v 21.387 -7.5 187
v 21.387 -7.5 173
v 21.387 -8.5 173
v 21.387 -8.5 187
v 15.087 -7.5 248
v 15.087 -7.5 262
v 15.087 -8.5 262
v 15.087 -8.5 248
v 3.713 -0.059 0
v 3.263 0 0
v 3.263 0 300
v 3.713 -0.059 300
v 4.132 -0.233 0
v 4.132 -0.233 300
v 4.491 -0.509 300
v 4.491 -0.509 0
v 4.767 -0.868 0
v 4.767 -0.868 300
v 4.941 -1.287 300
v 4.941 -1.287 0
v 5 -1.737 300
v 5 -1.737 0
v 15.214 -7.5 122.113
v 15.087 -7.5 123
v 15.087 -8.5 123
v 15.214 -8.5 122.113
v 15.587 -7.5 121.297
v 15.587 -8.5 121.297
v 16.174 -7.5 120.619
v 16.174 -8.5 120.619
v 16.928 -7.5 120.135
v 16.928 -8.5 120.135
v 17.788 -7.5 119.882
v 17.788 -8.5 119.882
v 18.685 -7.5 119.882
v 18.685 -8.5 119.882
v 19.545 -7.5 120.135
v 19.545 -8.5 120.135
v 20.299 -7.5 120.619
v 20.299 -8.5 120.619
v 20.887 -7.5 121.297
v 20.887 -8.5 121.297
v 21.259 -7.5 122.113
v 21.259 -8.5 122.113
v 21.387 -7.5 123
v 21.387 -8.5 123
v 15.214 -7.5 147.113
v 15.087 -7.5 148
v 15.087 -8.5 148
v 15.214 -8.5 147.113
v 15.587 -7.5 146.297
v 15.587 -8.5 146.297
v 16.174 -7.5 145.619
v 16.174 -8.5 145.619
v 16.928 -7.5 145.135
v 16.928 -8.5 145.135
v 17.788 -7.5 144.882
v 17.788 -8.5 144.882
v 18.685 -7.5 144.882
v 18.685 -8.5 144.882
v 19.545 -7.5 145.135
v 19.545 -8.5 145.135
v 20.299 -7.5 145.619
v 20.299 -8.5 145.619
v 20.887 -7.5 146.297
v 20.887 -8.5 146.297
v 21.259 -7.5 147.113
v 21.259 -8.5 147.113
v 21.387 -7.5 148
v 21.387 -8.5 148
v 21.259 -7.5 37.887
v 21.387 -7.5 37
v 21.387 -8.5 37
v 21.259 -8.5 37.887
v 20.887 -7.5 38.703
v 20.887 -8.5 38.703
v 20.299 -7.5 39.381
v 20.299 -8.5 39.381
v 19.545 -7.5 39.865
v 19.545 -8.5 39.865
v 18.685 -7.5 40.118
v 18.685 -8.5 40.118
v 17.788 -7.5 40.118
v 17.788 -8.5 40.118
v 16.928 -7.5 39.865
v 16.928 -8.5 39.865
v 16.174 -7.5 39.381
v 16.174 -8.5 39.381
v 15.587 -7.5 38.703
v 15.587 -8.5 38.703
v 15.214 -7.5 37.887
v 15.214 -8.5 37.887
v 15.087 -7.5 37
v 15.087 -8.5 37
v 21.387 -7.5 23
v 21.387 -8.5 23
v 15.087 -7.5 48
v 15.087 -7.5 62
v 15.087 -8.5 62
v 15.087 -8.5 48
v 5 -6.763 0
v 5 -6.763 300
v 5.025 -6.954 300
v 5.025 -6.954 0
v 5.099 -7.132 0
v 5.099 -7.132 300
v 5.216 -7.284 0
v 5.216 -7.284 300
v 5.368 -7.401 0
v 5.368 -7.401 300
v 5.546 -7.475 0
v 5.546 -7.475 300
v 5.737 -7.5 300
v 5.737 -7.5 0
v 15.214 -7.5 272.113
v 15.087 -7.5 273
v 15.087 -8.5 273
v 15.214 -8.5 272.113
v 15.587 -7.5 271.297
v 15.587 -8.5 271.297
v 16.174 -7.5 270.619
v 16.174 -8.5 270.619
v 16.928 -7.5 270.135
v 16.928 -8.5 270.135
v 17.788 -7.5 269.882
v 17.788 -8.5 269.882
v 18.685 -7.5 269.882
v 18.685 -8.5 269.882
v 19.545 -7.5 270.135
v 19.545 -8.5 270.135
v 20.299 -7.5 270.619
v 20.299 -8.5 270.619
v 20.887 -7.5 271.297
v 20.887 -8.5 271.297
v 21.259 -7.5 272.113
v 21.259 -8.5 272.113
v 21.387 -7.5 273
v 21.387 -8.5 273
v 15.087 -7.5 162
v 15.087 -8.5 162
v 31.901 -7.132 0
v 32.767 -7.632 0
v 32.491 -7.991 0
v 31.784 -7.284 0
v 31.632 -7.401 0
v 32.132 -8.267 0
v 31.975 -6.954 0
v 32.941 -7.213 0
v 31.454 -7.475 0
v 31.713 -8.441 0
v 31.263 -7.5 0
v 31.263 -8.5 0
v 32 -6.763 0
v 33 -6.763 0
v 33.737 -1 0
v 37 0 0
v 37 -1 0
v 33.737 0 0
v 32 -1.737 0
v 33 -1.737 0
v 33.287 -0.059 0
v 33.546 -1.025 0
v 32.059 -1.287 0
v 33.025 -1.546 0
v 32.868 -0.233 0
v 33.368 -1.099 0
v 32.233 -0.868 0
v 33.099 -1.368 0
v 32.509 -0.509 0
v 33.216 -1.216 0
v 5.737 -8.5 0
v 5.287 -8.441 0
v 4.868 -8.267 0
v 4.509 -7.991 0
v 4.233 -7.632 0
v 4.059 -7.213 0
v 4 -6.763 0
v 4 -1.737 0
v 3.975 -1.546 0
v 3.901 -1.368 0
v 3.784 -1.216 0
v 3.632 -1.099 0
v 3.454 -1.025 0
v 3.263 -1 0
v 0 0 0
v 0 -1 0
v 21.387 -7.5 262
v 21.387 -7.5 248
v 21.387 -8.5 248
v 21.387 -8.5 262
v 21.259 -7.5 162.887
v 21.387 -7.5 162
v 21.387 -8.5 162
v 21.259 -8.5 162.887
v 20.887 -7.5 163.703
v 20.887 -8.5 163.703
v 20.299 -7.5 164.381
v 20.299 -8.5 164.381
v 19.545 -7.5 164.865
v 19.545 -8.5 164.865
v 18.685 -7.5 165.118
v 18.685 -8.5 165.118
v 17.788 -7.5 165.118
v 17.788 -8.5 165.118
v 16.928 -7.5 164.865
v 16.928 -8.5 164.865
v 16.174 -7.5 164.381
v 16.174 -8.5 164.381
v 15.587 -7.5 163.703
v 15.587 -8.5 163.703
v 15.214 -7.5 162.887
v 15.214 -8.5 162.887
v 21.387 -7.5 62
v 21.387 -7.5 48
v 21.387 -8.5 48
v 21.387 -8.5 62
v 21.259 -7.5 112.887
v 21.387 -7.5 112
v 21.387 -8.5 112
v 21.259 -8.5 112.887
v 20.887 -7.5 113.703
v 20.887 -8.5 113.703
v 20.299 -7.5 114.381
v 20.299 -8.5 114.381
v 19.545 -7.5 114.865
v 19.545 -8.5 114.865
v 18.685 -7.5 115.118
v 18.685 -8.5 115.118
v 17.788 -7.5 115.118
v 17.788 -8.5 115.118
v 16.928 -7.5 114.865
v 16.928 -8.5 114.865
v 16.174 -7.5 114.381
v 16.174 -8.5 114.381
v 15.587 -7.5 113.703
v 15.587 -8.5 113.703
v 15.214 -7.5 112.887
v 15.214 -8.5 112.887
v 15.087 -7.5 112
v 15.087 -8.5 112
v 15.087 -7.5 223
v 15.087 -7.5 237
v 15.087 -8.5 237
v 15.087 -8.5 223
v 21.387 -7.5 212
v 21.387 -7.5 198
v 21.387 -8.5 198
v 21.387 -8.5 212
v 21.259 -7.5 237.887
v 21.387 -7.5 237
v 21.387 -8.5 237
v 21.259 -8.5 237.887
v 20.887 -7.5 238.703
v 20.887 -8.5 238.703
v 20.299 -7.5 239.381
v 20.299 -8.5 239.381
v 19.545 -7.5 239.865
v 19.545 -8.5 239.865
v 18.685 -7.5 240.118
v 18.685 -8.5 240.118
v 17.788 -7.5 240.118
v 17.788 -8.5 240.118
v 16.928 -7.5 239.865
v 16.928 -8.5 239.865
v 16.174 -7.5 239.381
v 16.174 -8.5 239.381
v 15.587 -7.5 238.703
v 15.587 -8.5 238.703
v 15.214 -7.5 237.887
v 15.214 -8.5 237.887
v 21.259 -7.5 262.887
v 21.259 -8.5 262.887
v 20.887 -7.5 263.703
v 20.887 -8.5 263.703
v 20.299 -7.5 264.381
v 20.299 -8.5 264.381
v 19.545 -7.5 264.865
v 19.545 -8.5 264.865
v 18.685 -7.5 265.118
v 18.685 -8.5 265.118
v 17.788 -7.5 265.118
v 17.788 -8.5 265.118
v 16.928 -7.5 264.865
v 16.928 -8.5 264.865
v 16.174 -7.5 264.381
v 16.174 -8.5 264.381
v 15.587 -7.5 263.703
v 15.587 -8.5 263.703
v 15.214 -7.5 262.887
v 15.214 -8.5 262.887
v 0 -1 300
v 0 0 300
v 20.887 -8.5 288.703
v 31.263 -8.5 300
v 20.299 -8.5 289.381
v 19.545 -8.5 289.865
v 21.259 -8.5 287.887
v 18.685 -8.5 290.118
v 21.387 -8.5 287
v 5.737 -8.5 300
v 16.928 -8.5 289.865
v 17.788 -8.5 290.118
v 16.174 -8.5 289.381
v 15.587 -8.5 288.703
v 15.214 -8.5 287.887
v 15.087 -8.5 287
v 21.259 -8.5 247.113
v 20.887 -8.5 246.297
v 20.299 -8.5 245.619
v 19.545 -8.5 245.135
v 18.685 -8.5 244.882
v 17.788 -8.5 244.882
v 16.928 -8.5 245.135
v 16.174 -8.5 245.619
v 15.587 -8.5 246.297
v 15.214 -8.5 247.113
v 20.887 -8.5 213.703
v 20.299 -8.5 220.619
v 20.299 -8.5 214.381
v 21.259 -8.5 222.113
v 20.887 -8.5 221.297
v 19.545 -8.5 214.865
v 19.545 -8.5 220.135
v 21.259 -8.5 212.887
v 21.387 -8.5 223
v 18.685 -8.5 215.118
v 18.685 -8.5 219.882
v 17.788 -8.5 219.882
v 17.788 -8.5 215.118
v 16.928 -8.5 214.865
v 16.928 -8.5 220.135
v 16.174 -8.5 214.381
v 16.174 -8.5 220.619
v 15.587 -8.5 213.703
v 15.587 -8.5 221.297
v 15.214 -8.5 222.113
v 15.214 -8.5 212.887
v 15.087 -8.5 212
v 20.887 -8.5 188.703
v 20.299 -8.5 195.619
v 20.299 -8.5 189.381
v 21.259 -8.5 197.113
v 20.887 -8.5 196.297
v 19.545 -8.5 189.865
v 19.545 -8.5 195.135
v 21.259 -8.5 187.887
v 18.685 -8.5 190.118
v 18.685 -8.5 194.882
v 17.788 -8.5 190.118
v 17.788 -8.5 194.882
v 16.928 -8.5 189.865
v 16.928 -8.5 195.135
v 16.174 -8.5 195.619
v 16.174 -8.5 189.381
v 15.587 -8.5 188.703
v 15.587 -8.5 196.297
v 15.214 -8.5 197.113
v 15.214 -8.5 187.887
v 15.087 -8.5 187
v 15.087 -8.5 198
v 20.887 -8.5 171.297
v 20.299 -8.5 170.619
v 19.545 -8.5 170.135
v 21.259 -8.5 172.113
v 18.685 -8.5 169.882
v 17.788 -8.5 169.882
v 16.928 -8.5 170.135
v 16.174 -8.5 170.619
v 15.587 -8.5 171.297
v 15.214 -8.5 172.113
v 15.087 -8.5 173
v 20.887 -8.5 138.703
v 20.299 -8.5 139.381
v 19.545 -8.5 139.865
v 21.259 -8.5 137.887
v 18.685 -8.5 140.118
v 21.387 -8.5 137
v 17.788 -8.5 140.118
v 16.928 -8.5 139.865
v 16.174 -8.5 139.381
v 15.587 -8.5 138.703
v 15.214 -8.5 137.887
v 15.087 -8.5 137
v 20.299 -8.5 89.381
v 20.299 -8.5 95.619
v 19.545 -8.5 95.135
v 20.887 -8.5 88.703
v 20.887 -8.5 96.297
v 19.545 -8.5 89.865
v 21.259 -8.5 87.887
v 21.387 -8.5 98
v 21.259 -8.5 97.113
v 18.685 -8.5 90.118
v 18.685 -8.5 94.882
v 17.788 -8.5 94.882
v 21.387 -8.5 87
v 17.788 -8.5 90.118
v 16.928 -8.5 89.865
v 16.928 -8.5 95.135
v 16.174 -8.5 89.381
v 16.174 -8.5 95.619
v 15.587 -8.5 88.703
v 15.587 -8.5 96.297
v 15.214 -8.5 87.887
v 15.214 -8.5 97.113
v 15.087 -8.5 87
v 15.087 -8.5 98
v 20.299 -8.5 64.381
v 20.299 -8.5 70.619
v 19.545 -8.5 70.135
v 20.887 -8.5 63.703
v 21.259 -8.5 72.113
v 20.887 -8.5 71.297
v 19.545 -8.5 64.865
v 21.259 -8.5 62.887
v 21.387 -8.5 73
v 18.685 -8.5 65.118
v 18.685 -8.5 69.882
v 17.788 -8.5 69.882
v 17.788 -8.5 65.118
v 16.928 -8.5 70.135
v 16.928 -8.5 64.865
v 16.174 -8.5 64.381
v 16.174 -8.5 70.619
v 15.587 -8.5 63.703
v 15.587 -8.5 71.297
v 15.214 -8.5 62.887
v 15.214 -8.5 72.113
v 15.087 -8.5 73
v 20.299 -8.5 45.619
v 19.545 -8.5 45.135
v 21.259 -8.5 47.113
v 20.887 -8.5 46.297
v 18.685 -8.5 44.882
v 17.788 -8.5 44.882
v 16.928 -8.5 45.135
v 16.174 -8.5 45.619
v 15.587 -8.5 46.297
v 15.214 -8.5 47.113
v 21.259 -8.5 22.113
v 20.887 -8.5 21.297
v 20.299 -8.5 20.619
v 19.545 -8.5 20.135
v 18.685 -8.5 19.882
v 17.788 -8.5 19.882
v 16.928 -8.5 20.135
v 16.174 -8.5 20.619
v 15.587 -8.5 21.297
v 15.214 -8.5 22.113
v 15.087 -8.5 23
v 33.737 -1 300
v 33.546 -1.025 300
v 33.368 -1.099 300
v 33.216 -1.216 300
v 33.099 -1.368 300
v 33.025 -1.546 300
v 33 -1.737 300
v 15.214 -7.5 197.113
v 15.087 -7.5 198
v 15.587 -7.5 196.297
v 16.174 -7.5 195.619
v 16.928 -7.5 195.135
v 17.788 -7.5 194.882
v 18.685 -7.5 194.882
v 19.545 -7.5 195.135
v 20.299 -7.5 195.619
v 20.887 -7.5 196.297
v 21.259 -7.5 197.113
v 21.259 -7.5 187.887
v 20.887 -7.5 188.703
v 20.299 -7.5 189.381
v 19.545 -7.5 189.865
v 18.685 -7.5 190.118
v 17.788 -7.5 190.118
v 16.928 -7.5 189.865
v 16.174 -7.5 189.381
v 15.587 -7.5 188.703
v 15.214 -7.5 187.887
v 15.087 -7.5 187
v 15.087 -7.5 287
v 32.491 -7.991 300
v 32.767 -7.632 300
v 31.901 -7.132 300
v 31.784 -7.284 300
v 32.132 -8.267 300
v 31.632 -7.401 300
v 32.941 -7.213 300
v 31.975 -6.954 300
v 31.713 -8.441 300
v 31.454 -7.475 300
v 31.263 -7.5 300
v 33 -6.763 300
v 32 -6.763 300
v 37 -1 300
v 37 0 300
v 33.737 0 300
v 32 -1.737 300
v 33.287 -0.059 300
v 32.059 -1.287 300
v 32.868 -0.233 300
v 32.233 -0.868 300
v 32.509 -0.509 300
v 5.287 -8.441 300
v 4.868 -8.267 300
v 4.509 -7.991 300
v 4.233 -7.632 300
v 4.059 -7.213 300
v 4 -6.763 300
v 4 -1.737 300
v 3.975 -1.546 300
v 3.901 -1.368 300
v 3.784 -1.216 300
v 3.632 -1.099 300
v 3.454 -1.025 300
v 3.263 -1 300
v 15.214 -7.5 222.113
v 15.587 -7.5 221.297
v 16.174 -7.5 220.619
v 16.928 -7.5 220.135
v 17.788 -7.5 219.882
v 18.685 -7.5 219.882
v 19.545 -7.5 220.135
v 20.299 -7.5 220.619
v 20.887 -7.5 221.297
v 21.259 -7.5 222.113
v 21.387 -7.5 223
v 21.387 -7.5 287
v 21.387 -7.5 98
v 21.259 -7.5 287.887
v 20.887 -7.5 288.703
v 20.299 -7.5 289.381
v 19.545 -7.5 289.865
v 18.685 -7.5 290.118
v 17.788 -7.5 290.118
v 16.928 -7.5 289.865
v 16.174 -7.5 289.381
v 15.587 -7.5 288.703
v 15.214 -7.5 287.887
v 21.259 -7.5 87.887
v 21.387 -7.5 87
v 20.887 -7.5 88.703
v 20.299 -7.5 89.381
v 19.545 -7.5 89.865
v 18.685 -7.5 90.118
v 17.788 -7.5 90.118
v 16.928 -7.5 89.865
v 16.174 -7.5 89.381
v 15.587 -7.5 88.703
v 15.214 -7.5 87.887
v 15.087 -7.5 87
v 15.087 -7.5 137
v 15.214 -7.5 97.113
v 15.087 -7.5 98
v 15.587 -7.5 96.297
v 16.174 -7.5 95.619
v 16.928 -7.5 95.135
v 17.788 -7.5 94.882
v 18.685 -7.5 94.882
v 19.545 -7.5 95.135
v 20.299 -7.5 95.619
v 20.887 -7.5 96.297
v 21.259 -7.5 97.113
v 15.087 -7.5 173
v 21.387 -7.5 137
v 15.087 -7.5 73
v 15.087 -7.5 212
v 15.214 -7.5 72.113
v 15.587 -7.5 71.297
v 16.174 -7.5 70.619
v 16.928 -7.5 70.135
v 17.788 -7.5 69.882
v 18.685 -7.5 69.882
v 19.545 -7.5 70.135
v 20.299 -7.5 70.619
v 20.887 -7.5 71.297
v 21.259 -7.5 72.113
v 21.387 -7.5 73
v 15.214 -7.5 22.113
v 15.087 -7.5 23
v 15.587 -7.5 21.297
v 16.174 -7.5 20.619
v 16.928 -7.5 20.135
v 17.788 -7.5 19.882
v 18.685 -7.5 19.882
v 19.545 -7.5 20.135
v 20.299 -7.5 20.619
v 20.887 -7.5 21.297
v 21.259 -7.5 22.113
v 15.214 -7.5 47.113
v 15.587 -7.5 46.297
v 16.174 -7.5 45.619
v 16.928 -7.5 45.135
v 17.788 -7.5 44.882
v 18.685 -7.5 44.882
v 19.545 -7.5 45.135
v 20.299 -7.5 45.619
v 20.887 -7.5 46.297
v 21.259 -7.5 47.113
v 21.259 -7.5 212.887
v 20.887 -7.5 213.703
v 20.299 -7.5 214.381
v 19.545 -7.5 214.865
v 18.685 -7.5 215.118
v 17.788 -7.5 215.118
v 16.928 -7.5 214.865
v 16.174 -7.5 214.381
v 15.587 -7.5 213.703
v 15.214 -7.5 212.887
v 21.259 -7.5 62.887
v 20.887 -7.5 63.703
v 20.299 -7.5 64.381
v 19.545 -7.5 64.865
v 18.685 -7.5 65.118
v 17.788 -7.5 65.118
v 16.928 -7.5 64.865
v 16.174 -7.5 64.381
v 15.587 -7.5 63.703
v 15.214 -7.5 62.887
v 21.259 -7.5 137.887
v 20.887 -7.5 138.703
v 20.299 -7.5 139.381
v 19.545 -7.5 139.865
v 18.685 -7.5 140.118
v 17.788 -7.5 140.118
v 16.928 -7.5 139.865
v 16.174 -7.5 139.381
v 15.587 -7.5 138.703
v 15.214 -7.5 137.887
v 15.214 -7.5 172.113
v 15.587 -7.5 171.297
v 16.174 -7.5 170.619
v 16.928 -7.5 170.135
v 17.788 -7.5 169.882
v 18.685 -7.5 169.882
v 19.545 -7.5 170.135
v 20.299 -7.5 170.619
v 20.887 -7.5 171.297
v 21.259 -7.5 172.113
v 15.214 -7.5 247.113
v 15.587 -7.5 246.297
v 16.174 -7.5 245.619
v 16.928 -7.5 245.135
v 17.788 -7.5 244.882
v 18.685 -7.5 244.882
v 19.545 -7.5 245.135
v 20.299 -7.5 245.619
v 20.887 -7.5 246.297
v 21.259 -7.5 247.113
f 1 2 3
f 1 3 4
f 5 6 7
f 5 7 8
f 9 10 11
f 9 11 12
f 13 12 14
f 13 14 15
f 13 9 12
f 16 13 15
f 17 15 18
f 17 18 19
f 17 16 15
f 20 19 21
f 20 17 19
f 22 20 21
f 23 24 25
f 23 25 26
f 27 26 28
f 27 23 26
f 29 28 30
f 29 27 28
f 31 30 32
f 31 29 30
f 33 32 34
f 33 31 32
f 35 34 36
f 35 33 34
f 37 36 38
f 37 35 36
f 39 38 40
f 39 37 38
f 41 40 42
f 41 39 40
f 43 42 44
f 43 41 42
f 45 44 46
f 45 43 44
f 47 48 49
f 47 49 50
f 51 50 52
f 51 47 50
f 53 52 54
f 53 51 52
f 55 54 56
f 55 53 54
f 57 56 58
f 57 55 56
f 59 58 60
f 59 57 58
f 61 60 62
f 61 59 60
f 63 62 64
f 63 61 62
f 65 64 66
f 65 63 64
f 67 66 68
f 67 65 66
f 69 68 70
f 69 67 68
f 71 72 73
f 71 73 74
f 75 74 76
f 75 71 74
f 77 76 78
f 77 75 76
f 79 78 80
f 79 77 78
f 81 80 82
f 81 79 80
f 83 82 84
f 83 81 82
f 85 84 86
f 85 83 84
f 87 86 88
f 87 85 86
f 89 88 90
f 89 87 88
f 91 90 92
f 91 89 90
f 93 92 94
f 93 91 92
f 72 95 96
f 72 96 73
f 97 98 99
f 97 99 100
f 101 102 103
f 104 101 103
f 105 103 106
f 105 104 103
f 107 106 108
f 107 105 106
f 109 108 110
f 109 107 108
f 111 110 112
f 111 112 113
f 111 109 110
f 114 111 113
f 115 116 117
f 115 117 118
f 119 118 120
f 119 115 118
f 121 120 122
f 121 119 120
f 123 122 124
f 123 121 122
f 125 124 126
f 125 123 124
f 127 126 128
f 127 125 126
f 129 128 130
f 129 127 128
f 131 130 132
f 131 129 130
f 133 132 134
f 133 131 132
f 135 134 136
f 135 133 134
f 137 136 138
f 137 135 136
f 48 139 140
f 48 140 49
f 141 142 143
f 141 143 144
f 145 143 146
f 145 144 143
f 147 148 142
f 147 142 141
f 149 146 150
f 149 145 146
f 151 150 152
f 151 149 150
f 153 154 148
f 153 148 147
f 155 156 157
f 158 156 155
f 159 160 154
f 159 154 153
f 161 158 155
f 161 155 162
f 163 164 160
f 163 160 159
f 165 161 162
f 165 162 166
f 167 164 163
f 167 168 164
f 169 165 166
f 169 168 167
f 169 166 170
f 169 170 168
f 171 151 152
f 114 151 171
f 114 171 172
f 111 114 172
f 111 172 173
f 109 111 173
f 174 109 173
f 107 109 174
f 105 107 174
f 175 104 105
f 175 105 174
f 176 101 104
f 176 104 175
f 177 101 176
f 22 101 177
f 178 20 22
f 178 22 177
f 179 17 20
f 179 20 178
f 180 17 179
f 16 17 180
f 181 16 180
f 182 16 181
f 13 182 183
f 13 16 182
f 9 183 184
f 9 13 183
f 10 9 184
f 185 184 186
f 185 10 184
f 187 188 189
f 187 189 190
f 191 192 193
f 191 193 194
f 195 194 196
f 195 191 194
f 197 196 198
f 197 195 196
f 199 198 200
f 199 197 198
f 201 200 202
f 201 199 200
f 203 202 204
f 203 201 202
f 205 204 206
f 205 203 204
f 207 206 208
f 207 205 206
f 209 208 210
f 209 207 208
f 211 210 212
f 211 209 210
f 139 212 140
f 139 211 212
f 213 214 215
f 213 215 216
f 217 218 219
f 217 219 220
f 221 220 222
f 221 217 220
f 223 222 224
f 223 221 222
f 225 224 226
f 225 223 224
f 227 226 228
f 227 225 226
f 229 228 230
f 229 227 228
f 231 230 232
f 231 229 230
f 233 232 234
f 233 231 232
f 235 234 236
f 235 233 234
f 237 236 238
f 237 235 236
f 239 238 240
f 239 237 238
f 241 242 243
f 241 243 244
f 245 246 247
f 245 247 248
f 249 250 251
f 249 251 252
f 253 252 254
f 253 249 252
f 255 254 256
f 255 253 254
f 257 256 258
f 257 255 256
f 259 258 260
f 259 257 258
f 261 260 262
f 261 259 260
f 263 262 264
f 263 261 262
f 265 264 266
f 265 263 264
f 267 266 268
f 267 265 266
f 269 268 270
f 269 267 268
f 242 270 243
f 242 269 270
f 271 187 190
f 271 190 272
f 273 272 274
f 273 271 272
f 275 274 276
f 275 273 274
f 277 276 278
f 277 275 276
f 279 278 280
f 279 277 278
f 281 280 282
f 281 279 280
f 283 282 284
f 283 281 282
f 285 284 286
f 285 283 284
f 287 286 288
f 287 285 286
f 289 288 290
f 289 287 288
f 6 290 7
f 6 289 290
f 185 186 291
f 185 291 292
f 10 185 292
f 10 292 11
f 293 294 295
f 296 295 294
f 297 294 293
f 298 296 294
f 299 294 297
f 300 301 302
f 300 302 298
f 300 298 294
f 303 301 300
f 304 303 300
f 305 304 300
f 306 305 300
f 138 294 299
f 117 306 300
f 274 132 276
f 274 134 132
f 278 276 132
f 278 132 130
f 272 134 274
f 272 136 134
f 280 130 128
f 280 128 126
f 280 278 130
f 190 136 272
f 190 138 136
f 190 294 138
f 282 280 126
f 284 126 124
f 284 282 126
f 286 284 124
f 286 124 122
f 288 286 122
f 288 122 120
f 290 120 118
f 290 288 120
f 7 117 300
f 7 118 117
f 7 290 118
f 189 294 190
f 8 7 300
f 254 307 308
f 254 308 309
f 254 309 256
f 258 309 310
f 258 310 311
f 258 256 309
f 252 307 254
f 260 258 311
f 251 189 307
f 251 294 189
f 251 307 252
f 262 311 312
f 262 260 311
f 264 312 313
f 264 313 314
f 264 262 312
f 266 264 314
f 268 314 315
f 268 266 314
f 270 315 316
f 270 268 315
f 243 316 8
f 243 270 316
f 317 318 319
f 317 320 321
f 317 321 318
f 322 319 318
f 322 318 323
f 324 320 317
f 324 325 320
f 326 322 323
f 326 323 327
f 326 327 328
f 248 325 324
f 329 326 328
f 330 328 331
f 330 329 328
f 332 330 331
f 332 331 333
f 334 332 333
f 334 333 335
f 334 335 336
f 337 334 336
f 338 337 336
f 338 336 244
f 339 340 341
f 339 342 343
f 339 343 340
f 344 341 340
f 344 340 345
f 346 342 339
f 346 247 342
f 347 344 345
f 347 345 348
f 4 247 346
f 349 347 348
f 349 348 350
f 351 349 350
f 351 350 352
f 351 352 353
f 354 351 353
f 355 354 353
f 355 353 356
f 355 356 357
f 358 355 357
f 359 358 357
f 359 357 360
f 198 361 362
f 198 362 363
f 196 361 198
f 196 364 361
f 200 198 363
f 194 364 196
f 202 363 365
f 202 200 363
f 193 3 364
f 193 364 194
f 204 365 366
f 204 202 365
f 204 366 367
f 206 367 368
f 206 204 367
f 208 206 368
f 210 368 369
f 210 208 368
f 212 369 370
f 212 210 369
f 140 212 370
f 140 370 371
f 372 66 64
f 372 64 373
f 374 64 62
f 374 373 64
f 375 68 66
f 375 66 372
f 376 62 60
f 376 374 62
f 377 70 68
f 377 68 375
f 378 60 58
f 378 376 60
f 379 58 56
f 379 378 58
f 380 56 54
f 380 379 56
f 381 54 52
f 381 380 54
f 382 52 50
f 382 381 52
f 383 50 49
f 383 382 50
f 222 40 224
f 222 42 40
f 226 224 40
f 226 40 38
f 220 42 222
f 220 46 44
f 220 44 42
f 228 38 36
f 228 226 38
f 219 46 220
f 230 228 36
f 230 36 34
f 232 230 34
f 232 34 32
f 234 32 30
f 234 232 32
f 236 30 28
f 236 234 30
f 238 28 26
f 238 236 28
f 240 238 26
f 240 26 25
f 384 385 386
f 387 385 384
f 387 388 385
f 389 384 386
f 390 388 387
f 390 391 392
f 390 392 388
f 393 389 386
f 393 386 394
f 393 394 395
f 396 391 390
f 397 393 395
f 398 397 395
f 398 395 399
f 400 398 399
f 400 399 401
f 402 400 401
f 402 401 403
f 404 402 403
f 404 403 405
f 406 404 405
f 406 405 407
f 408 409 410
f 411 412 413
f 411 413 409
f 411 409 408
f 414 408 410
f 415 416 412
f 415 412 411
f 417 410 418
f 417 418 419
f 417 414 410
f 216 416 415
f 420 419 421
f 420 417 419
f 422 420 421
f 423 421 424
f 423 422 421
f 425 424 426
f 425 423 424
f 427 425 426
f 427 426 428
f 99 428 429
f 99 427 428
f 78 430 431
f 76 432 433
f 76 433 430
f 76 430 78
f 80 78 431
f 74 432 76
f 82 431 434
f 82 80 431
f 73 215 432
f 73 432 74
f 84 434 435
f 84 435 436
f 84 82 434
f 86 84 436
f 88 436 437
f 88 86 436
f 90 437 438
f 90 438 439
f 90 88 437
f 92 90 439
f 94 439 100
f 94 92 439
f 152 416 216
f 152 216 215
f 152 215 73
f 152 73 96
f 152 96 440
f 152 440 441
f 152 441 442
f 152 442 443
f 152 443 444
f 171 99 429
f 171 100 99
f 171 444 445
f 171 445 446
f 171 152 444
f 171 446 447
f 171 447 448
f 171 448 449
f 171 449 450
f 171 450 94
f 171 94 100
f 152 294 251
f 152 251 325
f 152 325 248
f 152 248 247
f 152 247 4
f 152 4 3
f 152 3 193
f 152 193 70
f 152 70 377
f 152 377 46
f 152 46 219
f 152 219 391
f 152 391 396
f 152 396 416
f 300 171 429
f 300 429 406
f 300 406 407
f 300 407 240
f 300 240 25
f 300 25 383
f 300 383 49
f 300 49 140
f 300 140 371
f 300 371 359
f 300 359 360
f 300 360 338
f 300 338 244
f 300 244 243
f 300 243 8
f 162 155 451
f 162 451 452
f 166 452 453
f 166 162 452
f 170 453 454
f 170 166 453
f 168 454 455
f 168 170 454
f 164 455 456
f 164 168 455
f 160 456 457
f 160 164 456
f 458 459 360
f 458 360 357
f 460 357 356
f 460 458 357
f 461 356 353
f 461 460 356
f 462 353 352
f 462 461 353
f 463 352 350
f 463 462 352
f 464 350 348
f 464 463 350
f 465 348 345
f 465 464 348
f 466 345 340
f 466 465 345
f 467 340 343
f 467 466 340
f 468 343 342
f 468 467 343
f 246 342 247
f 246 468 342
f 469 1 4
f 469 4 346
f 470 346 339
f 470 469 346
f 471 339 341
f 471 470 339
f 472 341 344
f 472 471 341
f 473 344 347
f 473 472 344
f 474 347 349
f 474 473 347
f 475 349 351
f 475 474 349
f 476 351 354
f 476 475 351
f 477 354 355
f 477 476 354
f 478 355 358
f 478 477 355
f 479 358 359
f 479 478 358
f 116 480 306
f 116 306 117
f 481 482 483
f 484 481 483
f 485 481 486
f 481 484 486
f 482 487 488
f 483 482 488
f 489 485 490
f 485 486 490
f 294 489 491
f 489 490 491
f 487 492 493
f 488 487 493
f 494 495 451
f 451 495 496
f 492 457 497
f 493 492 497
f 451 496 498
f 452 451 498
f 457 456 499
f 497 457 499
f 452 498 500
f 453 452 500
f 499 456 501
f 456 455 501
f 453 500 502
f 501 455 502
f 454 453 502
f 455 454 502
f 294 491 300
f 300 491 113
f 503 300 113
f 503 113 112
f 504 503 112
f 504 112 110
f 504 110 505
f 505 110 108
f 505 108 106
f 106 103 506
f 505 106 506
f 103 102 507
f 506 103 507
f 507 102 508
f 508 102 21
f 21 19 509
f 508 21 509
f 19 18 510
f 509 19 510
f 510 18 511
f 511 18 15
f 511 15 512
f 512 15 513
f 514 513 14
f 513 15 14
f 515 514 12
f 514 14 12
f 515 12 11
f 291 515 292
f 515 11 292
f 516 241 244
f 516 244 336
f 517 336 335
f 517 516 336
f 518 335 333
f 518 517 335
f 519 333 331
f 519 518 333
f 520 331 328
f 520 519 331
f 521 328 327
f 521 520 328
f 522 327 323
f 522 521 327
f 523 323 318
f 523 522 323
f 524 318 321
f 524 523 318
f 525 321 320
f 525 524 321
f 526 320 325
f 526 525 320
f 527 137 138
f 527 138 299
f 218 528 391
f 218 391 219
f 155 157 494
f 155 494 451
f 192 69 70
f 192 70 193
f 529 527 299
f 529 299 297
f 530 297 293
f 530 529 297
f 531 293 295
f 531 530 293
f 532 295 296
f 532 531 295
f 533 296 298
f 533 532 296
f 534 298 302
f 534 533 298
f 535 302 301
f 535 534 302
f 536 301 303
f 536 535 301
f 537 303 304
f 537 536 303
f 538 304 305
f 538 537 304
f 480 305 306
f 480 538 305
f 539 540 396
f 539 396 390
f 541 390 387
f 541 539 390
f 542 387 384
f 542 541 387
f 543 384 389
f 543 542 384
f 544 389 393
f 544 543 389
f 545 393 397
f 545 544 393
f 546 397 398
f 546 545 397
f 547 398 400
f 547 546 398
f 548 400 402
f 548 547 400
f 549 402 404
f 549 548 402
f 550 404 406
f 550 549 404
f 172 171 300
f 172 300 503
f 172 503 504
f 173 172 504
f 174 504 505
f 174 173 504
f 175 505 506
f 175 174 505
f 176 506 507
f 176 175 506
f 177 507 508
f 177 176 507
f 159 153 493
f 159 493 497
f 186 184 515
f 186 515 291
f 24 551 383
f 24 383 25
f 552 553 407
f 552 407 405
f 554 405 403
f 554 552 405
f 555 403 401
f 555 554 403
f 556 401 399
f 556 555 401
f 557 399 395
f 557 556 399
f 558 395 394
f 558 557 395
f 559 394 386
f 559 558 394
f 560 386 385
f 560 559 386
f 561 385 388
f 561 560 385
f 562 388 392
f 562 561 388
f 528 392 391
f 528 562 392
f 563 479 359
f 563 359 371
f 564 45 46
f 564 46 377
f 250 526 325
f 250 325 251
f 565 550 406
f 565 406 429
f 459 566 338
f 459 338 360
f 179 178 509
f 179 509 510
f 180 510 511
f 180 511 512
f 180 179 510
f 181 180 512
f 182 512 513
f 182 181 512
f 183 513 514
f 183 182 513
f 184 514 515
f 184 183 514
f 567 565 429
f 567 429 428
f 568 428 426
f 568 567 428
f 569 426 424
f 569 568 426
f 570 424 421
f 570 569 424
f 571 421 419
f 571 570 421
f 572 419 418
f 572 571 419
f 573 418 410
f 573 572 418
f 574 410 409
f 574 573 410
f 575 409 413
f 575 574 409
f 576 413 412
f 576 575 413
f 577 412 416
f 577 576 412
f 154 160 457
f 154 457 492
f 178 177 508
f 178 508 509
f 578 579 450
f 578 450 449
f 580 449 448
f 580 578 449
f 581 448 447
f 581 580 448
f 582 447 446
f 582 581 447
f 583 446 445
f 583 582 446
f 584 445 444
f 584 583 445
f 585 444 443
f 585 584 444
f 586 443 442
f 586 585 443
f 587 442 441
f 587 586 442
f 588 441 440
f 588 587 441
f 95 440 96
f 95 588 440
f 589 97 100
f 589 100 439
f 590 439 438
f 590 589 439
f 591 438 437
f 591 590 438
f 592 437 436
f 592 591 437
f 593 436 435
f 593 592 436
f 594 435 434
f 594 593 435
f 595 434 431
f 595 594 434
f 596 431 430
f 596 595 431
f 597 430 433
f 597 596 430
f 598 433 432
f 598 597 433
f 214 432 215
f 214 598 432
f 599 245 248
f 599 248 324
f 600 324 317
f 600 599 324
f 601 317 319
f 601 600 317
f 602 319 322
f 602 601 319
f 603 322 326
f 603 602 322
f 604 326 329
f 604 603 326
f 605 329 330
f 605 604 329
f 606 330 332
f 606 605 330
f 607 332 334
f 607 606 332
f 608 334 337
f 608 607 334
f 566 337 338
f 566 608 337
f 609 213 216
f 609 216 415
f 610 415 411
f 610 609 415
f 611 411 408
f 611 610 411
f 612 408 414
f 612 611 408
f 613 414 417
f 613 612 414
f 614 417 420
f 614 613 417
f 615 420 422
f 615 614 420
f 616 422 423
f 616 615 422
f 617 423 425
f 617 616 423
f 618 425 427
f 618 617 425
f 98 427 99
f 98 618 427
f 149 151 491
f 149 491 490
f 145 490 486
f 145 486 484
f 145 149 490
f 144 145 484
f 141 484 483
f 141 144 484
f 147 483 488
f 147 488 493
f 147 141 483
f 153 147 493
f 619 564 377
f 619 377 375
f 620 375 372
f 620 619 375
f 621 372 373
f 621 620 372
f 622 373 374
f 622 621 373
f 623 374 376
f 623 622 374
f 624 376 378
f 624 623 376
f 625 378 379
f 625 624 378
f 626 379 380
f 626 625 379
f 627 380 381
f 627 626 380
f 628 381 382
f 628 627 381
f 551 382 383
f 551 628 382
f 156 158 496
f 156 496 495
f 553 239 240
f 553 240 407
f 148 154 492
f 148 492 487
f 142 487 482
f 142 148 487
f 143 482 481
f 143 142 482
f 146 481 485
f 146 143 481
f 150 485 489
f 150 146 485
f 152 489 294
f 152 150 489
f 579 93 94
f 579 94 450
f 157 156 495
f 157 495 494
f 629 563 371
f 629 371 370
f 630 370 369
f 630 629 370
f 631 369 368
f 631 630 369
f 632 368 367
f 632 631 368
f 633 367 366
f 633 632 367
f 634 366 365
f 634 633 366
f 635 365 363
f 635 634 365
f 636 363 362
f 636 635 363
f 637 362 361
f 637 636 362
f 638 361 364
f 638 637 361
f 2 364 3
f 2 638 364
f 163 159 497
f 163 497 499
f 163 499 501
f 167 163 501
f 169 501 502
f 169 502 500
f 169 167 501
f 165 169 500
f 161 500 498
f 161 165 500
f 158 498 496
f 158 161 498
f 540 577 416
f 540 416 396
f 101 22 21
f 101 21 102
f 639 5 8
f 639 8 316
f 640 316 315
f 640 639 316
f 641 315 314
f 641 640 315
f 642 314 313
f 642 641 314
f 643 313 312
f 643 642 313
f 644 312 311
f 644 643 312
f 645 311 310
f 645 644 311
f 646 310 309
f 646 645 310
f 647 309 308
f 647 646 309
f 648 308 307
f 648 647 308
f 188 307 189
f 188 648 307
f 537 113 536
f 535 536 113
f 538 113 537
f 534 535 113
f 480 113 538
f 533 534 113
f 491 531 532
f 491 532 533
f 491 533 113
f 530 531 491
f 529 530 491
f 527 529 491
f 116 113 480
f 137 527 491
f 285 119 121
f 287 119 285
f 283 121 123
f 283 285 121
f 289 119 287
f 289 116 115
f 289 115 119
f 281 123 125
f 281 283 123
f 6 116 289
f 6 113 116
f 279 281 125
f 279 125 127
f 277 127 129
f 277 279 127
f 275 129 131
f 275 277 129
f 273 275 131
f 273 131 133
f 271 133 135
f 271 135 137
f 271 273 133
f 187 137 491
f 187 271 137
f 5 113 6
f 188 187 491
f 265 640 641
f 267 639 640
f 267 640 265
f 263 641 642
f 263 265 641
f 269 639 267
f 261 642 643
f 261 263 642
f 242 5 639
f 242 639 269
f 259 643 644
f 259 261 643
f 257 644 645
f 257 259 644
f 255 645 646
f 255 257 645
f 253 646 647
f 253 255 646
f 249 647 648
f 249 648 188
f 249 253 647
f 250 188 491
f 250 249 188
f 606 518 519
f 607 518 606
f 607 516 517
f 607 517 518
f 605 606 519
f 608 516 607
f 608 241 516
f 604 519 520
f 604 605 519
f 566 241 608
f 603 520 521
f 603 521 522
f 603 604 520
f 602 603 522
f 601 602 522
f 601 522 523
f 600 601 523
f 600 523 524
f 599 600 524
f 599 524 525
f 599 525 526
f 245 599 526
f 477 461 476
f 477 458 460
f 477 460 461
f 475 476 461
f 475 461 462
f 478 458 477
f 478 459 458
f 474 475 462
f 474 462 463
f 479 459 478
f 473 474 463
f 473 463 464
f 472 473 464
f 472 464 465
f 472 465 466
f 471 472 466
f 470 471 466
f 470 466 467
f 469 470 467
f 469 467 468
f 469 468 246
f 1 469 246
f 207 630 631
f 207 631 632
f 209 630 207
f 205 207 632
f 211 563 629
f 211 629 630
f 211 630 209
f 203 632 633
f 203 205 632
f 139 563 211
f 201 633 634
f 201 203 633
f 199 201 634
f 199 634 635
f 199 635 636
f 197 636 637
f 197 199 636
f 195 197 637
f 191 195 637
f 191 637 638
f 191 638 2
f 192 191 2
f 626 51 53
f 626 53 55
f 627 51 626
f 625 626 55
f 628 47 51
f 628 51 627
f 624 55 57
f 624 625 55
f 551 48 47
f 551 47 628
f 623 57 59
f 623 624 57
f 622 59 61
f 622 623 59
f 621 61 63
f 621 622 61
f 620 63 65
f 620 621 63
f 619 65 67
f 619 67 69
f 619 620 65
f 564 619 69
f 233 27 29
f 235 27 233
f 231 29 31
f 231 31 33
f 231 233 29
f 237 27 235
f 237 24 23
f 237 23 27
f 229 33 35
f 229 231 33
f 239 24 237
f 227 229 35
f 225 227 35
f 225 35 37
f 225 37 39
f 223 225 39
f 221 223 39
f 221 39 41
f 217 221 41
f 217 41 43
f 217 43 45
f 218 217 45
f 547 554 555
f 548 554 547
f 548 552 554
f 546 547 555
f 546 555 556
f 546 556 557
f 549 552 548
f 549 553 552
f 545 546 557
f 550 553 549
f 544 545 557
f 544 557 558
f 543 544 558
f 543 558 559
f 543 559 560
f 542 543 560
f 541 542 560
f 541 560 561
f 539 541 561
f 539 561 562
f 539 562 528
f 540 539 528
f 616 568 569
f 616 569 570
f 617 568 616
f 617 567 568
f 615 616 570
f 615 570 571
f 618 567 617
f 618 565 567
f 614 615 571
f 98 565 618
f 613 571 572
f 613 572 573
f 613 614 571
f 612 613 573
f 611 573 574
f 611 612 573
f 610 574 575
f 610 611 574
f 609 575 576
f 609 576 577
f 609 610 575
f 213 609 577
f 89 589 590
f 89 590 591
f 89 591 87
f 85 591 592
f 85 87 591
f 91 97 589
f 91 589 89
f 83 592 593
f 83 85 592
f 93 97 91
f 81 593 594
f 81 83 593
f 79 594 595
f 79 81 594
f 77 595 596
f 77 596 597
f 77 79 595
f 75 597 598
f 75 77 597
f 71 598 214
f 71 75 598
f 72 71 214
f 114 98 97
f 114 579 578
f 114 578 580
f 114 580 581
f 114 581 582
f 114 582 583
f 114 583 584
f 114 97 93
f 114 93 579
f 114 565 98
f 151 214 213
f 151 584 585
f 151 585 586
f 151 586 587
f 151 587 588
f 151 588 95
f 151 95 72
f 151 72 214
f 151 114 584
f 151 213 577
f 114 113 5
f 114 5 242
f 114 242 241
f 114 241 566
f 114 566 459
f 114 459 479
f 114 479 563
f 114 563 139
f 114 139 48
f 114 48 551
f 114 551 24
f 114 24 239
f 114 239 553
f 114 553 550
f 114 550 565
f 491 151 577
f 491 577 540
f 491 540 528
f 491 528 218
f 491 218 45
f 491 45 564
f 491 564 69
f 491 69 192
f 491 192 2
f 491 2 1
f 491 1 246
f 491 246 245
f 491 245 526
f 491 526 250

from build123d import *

# Parameters (mm, degrees)
BASE_FLANGE1_DEPTH = 300
CUT_EXTRUDE1_DEPTH = 10
LPATTERN1_COUNT    = 11
LPATTERN1_PITCH    = 25


# Sheet-metal steps are written as plain solids
with BuildPart() as part:
    # Sketch1 → Base-Flange1 (new body)
    with BuildSketch(Plane.XY):
        with BuildLine():
            Line((0, 0), (3.2634, 0))
            ThreePointArc((3.2634, 0), (4.491361636, -0.508638364), (5, -1.7366))
            Line((5, -1.7366), (5, -6.7634))
            ThreePointArc((5, -6.7634), (5.215745145, -7.284254855), (5.7366, -7.5))
            Line((5.7366, -7.5), (31.2634, -7.5))
            ThreePointArc((31.2634, -7.5), (31.784254855, -7.284254855), (32, -6.7634))
            Line((32, -6.7634), (32, -1.7366))
            ThreePointArc((32, -1.7366), (32.508638364, -0.508638364), (33.7366, 0))
            Line((33.7366, 0), (37, 0))
            Line((37, 0), (37, -1))
            Line((37, -1), (33.7366, -1))
            ThreePointArc((33.7366, -1), (33.215745145, -1.215745145), (33, -1.7366))
            Line((33, -1.7366), (33, -6.7634))
            ThreePointArc((33, -6.7634), (32.491361636, -7.991361636), (31.2634, -8.5))
            Line((31.2634, -8.5), (5.7366, -8.5))
            ThreePointArc((5.7366, -8.5), (4.508638364, -7.991361636), (4, -6.7634))
            Line((4, -6.7634), (4, -1.7366))
            ThreePointArc((4, -1.7366), (3.784254855, -1.215745145), (3.2634, -1))
            Line((3.2634, -1), (0, -1))
            Line((0, -1), (0, 0))
        make_face()
    extrude(amount=BASE_FLANGE1_DEPTH)

    # Sketch6 → Cut-Extrude1 (cut)
    with BuildSketch(Plane(origin=(0, -7.5, 0), x_dir=(1, 0, 0), z_dir=(0, 1, 0))):
        with BuildLine():
            Line((21.3866, -273), (21.3866, -287))
            ThreePointArc((21.3866, -287), (18.2366, -290.15), (15.0866, -287))
            Line((15.0866, -287), (15.0866, -273))
            ThreePointArc((15.0866, -273), (18.2366, -269.85), (21.3866, -273))
        make_face()
    cut_extrude1 = extrude(amount=-CUT_EXTRUDE1_DEPTH, mode=Mode.SUBTRACT)

    # LPattern1: Cut-Extrude1 ×11
    with Locations(*[(0, 0, -i * LPATTERN1_PITCH) for i in range(1, LPATTERN1_COUNT)]):
        add(cut_extrude1, mode=Mode.SUBTRACT)


solid = part.part
